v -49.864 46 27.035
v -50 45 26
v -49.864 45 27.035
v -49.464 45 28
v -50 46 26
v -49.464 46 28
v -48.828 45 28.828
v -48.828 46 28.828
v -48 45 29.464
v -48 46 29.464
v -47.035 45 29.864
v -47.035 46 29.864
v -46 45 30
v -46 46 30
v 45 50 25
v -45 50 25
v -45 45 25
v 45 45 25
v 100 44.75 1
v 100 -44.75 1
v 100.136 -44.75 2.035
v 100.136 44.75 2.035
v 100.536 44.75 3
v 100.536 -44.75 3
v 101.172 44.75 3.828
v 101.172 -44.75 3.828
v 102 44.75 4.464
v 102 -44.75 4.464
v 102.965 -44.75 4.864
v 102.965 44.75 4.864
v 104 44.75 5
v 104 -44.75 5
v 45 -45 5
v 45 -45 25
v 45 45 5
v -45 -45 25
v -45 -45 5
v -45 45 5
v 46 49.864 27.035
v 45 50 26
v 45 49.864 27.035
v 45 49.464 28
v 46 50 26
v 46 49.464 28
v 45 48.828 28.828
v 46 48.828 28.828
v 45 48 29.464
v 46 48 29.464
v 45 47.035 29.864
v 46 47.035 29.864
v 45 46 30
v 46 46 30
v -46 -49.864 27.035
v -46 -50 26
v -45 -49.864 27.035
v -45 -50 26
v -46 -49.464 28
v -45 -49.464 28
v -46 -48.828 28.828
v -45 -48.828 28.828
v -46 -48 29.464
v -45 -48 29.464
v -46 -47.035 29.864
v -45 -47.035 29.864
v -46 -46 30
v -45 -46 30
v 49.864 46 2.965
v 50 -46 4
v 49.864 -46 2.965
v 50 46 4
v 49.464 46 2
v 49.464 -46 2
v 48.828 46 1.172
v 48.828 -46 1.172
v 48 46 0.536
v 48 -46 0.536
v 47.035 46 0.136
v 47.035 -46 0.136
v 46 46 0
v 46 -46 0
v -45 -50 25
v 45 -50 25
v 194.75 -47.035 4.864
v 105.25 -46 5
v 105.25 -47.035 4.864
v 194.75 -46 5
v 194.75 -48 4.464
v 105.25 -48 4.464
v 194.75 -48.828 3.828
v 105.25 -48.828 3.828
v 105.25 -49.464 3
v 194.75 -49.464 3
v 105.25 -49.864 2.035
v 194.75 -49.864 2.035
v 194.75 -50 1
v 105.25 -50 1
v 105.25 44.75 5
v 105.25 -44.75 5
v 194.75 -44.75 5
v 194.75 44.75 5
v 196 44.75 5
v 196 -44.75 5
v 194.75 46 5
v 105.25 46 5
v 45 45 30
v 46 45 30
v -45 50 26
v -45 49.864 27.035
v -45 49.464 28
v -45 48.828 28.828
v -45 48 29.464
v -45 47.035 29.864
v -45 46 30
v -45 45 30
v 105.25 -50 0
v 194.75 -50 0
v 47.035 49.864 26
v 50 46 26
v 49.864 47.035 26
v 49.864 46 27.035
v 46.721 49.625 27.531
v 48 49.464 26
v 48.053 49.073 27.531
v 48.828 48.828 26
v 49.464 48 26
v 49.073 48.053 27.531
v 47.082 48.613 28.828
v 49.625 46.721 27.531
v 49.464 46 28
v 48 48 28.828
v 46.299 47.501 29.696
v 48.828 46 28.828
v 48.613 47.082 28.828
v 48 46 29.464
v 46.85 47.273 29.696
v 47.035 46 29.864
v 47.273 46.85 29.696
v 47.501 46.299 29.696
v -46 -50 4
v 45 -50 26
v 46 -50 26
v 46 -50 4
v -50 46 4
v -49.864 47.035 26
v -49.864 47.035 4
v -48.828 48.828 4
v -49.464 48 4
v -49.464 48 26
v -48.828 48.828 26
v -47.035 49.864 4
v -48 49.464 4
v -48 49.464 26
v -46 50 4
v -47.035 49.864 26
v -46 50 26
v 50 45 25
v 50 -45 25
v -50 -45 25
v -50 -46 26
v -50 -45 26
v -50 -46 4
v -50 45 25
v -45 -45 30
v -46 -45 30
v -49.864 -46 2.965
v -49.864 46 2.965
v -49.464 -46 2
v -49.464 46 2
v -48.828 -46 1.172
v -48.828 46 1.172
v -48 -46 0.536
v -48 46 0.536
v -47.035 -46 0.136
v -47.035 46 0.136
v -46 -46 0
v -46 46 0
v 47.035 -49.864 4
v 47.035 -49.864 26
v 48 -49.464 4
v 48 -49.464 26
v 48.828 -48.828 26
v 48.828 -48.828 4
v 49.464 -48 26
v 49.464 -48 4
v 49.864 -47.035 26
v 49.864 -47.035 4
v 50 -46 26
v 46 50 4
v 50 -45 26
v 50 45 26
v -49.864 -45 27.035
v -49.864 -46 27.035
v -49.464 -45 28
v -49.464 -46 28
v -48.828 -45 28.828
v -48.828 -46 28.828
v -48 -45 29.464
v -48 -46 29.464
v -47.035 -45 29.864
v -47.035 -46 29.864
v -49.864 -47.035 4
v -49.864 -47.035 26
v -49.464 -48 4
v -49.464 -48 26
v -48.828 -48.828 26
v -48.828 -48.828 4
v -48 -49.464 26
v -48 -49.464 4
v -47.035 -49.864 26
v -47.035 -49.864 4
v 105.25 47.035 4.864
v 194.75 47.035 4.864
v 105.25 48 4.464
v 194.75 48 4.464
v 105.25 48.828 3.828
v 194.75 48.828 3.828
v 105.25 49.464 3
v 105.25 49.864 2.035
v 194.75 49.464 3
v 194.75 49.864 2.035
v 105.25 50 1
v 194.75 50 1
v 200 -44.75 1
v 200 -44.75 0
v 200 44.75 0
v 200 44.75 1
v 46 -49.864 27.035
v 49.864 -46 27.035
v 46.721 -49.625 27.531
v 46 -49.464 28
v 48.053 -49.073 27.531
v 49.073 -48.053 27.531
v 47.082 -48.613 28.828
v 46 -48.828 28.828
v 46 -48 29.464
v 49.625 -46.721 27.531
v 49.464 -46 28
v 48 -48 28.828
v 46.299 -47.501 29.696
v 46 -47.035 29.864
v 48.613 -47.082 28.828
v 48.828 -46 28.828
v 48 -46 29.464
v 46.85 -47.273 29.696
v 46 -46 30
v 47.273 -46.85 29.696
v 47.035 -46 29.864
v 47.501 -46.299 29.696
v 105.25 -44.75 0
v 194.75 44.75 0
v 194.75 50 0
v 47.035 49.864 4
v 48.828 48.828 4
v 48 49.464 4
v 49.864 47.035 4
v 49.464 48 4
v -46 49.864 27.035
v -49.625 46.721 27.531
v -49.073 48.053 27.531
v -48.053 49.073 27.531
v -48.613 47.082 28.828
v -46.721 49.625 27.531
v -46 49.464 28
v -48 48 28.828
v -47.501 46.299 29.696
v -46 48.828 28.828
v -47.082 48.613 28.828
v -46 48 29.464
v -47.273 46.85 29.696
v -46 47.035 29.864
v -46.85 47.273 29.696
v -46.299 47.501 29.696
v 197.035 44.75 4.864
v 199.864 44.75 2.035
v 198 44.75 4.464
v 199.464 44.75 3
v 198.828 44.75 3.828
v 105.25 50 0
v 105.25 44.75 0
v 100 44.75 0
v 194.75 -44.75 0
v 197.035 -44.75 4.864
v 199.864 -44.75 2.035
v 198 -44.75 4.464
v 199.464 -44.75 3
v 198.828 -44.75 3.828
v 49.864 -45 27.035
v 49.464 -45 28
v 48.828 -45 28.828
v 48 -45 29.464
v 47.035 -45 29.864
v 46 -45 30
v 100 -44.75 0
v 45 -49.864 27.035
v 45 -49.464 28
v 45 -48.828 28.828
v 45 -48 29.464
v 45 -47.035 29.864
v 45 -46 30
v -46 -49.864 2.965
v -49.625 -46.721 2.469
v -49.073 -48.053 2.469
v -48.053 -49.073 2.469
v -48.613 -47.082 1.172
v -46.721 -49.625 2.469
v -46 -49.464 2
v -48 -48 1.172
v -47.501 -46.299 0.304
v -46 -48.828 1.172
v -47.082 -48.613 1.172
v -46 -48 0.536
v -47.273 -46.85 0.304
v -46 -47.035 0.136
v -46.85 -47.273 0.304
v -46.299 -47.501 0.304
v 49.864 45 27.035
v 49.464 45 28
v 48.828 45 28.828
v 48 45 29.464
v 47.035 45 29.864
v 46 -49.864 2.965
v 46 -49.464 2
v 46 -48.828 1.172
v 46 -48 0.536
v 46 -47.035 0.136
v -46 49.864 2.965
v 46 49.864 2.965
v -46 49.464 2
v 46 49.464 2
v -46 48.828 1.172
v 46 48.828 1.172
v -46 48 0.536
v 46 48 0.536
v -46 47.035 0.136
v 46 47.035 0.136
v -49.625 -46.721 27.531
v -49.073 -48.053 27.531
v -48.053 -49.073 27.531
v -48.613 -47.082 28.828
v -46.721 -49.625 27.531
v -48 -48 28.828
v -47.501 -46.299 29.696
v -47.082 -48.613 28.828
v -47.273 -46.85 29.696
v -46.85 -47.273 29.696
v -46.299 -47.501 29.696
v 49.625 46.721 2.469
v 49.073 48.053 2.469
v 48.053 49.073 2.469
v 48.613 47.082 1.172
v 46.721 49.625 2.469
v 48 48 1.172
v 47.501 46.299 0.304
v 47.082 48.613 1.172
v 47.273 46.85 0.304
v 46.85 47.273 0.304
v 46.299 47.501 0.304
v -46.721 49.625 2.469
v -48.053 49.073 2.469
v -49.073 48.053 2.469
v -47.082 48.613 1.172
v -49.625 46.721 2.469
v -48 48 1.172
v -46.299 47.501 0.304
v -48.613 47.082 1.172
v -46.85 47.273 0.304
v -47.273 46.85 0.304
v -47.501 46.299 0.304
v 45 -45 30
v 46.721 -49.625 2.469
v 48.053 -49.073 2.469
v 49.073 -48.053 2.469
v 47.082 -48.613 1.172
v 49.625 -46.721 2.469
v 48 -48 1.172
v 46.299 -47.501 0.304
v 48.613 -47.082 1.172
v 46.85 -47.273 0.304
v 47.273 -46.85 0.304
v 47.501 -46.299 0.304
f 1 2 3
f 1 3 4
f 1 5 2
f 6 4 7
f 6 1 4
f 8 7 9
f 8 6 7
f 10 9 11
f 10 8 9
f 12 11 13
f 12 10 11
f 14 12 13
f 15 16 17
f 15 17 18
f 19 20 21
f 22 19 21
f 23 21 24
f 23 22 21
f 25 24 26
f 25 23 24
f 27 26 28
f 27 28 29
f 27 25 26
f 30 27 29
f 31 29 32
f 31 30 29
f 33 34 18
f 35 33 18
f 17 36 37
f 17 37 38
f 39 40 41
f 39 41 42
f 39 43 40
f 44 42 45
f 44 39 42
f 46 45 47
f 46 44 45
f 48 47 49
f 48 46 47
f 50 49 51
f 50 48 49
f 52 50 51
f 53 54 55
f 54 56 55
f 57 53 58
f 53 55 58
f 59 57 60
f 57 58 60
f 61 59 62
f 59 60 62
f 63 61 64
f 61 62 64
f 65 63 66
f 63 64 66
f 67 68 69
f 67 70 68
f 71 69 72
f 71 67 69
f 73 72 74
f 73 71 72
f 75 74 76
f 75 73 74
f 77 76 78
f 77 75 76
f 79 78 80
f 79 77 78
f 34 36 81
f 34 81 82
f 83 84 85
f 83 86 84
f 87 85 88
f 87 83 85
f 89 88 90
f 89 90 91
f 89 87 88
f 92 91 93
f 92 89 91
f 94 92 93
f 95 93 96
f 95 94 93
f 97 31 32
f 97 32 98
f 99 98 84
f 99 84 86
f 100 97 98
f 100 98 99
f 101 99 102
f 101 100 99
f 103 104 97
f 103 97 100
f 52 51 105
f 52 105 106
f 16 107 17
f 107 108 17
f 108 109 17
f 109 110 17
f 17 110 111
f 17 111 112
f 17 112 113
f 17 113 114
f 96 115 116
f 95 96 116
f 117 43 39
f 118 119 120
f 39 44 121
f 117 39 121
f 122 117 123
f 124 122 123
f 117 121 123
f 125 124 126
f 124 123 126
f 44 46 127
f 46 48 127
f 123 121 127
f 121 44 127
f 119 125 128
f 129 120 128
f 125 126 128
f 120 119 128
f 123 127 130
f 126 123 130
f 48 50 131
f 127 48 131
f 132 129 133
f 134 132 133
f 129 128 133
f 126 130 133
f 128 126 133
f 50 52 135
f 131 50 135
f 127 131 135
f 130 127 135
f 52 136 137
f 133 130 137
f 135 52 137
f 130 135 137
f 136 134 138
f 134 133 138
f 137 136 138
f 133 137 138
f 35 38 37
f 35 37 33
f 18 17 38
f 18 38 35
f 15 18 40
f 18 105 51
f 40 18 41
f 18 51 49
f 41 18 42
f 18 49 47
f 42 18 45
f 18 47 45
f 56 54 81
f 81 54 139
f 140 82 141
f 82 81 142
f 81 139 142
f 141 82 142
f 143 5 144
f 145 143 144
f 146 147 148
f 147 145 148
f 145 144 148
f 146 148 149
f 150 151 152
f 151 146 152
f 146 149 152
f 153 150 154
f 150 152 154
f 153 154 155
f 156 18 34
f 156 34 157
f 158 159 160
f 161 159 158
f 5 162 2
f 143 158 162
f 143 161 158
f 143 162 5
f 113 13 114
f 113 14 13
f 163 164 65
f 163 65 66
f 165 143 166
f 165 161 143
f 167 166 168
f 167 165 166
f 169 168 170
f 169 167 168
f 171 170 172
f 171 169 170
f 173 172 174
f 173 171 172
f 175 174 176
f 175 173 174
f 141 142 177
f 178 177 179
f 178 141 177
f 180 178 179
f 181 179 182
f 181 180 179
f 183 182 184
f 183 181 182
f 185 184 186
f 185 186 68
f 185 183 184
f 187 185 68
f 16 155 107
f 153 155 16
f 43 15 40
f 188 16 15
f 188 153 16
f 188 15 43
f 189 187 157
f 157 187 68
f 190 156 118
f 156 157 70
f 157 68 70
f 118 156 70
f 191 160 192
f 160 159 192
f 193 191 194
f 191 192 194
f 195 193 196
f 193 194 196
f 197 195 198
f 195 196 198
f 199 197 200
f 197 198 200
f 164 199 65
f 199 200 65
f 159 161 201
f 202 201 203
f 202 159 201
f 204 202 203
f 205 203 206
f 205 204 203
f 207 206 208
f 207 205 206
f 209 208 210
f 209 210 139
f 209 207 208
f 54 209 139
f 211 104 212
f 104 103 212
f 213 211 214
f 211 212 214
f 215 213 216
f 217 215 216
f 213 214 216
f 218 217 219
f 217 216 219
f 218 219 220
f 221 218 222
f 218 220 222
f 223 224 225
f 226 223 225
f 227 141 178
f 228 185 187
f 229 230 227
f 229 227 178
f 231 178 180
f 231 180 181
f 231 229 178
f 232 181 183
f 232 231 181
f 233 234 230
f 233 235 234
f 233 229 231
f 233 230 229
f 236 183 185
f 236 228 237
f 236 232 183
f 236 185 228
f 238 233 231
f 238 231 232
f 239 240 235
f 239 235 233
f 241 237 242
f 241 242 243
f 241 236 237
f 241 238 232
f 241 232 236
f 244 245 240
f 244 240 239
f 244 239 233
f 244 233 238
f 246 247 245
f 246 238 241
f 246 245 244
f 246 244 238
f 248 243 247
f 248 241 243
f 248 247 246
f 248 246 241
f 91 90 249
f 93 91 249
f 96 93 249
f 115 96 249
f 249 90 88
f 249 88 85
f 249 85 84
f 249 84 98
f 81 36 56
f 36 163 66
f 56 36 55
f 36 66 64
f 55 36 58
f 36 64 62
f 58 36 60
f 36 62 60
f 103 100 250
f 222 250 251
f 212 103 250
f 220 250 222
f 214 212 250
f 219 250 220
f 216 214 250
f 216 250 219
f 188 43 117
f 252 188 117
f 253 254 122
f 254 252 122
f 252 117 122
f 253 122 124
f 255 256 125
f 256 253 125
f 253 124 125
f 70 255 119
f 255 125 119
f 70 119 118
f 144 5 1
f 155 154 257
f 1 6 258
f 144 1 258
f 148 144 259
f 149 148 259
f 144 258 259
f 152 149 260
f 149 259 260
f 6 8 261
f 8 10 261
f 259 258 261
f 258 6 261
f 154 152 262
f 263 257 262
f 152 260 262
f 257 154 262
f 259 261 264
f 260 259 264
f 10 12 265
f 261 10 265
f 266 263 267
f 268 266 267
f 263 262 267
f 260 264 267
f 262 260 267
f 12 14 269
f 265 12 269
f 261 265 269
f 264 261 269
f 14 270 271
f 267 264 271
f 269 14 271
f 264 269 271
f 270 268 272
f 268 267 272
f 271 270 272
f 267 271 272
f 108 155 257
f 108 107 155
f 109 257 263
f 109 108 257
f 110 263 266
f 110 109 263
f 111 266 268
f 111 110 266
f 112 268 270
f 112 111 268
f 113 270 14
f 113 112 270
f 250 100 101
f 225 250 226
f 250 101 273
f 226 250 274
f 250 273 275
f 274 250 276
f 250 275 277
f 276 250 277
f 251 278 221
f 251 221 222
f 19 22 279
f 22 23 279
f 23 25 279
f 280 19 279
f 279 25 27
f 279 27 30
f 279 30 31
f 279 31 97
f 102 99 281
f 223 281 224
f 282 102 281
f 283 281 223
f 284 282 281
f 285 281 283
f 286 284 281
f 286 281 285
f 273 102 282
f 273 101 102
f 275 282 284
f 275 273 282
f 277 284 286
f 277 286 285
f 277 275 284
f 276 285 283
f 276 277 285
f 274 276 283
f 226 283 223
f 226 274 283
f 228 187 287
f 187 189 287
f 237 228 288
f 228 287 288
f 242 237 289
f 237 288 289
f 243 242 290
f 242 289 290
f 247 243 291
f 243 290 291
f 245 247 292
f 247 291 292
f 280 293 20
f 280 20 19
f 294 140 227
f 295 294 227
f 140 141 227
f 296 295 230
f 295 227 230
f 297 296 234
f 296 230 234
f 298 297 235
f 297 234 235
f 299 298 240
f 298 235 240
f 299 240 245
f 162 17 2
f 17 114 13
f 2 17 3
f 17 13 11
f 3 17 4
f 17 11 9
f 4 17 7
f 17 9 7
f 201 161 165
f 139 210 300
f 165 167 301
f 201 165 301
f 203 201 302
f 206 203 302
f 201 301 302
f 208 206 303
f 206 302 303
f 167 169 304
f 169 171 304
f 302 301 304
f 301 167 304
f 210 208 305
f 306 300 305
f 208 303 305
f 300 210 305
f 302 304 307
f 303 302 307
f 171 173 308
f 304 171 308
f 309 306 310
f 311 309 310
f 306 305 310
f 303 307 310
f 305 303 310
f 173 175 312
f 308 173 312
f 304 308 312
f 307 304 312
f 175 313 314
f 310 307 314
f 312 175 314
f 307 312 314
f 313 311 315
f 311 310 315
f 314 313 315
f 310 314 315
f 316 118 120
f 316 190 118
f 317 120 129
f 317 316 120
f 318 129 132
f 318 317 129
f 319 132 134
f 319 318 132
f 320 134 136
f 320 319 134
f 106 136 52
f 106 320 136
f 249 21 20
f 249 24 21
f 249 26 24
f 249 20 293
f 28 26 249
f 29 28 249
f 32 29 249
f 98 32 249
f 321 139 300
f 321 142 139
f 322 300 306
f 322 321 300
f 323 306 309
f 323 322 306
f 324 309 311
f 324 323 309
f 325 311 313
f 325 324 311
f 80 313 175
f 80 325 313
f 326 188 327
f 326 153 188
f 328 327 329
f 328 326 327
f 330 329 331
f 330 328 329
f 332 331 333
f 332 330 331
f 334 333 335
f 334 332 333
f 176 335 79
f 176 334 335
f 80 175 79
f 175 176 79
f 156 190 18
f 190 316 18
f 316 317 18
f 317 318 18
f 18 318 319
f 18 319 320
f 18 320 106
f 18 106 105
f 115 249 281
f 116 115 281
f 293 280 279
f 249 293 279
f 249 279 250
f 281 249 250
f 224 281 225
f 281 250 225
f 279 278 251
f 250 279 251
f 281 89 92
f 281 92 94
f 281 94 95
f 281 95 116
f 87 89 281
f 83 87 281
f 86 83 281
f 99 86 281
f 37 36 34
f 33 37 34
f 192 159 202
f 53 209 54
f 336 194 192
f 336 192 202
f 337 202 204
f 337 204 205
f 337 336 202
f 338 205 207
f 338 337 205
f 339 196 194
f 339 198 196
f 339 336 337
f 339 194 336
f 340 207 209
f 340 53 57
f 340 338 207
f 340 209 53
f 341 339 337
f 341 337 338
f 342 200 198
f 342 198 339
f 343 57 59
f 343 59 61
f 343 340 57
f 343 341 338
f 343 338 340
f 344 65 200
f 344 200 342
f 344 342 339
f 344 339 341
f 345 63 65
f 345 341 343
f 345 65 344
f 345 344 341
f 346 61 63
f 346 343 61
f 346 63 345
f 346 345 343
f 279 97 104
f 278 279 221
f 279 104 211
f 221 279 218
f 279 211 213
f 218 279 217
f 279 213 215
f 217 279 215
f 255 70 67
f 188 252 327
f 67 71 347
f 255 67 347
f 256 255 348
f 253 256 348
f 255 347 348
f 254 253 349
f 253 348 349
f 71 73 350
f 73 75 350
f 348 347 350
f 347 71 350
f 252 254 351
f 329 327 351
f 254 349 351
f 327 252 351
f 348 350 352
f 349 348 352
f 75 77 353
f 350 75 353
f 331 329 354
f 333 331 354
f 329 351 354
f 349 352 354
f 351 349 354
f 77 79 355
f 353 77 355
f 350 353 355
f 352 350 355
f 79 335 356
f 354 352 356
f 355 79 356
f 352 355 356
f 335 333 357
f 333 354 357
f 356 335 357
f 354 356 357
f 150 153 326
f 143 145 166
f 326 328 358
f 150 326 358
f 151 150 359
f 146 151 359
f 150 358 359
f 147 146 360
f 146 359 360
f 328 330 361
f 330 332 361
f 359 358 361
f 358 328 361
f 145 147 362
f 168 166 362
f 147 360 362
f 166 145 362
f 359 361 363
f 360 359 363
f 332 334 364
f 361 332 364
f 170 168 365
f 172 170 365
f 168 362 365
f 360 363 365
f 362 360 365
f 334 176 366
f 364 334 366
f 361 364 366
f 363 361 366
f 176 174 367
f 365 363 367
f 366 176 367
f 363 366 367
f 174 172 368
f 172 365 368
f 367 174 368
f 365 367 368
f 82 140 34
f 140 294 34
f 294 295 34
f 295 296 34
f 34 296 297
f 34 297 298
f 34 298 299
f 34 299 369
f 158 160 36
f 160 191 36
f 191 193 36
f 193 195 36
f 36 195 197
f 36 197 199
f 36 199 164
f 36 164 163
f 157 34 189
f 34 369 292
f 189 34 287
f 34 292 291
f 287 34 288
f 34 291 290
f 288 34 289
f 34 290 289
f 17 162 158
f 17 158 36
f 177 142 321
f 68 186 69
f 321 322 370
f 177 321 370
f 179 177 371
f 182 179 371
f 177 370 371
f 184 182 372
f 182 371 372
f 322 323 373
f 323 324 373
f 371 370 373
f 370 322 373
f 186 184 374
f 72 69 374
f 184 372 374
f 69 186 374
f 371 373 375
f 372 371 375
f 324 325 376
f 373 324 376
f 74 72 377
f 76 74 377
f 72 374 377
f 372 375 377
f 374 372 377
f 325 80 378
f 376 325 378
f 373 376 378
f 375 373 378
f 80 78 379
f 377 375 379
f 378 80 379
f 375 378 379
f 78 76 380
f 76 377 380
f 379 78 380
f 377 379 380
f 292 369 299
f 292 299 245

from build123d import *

# Parameters (mm, degrees)
SKETCH_W        = 100
SKETCH_H        = 100
PAD_DEPTH       = 30
SKETCH001_W     = 90
SKETCH001_H     = 90
POCKET_DEPTH    = 25
POCKET001_DEPTH = 5
FILLET_R        = 4
FILLET001_R     = 4
FILLET003_R     = 4
SKETCH002_W     = 100
SKETCH002_H     = 100
PAD001_DEPTH    = 5
SKETCH004_W     = 5.25
SKETCH004_H     = 5.25
POCKET002_DEPTH = 5.001
FILLET002_R     = 4


with BuildPart() as boxbase:
    # Sketch → Pad (new body)
    with BuildSketch(Plane.XY):
        Rectangle(SKETCH_W, SKETCH_H)
    extrude(amount=PAD_DEPTH)

    # Sketch001 (on Face6 of Pad) → Pocket (cut)
    with BuildSketch(Plane.XY.offset(30)):
        Rectangle(SKETCH001_W, SKETCH001_H)
    extrude(amount=-POCKET_DEPTH, mode=Mode.SUBTRACT)

    # Sketch003 (on Face5 of Pocket) → Pocket001 (cut)
    with BuildSketch(Plane.XY.offset(30)):
        Polygon((-45, 50), (-45, 45), (-50, 45), (-50, -45), (-45, -45), (-45, -50), (45, -50), (45, -45), (50, -45), (50, 45), (45, 45), (45, 50), align=None)
    extrude(amount=-POCKET001_DEPTH, mode=Mode.SUBTRACT)

    # Fillet
    fillet_edges = [boxbase.edges().sort_by_distance(p)[0] for p in [
        (50, 50, 15),
        (50, -50, 15),
        (-50, -50, 15),
        (-50, 50, 15),
    ]]
    fillet(fillet_edges, radius=FILLET_R)

    # Fillet001
    fillet001_edges = [boxbase.edges().sort_by_distance(p)[0] for p in [
        (-48.828427, 48.828427, 30),
        (48.828427, 48.828427, 30),
        (48.828427, -48.828427, 30),
        (-48.828427, -48.828427, 30),
    ]]
    fillet(fillet001_edges, radius=FILLET001_R)

    # Fillet003
    fillet003_edges = [boxbase.edges().sort_by_distance(p)[0] for p in [
        (-48.828427, -48.828427, 0),
        (0, -50, 0),
        (48.828427, -48.828427, 0),
        (50, 0, 0),
        (48.828427, 48.828427, 0),
        (0, 50, 0),
        (-48.828427, 48.828427, 0),
        (-50, 0, 0),
    ]]
    fillet(fillet003_edges, radius=FILLET003_R)


with BuildPart() as boxtop:
    # Sketch002 → Pad001 (new body)
    with BuildSketch(Plane.XY):
        with Locations((150, 0)):
            Rectangle(SKETCH002_W, SKETCH002_H)
    extrude(amount=PAD001_DEPTH)

    # Sketch004 (on Face6 of Pad001) → Pocket002 (cut, through all)
    with BuildSketch(Plane.XY.offset(5)):
        with Locations((102.625, 47.375)):
            Rectangle(SKETCH004_W, SKETCH004_H)
        with Locations((197.375, 47.375)):
            Rectangle(SKETCH004_W, SKETCH004_H)
        with Locations((102.625, -47.375)):
            Rectangle(SKETCH004_W, SKETCH004_H)
        with Locations((197.375, -47.375)):
            Rectangle(SKETCH004_W, SKETCH004_H)
    extrude(amount=-POCKET002_DEPTH, mode=Mode.SUBTRACT)

    # Fillet002
    fillet002_edges = [boxtop.edges().sort_by_distance(p)[0] for p in [
        (150, 50, 5),
        (200, 0, 5),
        (150, -50, 5),
        (100, 0, 5),
    ]]
    fillet(fillet002_edges, radius=FILLET002_R)


solid = Compound([boxbase.part, boxtop.part])
